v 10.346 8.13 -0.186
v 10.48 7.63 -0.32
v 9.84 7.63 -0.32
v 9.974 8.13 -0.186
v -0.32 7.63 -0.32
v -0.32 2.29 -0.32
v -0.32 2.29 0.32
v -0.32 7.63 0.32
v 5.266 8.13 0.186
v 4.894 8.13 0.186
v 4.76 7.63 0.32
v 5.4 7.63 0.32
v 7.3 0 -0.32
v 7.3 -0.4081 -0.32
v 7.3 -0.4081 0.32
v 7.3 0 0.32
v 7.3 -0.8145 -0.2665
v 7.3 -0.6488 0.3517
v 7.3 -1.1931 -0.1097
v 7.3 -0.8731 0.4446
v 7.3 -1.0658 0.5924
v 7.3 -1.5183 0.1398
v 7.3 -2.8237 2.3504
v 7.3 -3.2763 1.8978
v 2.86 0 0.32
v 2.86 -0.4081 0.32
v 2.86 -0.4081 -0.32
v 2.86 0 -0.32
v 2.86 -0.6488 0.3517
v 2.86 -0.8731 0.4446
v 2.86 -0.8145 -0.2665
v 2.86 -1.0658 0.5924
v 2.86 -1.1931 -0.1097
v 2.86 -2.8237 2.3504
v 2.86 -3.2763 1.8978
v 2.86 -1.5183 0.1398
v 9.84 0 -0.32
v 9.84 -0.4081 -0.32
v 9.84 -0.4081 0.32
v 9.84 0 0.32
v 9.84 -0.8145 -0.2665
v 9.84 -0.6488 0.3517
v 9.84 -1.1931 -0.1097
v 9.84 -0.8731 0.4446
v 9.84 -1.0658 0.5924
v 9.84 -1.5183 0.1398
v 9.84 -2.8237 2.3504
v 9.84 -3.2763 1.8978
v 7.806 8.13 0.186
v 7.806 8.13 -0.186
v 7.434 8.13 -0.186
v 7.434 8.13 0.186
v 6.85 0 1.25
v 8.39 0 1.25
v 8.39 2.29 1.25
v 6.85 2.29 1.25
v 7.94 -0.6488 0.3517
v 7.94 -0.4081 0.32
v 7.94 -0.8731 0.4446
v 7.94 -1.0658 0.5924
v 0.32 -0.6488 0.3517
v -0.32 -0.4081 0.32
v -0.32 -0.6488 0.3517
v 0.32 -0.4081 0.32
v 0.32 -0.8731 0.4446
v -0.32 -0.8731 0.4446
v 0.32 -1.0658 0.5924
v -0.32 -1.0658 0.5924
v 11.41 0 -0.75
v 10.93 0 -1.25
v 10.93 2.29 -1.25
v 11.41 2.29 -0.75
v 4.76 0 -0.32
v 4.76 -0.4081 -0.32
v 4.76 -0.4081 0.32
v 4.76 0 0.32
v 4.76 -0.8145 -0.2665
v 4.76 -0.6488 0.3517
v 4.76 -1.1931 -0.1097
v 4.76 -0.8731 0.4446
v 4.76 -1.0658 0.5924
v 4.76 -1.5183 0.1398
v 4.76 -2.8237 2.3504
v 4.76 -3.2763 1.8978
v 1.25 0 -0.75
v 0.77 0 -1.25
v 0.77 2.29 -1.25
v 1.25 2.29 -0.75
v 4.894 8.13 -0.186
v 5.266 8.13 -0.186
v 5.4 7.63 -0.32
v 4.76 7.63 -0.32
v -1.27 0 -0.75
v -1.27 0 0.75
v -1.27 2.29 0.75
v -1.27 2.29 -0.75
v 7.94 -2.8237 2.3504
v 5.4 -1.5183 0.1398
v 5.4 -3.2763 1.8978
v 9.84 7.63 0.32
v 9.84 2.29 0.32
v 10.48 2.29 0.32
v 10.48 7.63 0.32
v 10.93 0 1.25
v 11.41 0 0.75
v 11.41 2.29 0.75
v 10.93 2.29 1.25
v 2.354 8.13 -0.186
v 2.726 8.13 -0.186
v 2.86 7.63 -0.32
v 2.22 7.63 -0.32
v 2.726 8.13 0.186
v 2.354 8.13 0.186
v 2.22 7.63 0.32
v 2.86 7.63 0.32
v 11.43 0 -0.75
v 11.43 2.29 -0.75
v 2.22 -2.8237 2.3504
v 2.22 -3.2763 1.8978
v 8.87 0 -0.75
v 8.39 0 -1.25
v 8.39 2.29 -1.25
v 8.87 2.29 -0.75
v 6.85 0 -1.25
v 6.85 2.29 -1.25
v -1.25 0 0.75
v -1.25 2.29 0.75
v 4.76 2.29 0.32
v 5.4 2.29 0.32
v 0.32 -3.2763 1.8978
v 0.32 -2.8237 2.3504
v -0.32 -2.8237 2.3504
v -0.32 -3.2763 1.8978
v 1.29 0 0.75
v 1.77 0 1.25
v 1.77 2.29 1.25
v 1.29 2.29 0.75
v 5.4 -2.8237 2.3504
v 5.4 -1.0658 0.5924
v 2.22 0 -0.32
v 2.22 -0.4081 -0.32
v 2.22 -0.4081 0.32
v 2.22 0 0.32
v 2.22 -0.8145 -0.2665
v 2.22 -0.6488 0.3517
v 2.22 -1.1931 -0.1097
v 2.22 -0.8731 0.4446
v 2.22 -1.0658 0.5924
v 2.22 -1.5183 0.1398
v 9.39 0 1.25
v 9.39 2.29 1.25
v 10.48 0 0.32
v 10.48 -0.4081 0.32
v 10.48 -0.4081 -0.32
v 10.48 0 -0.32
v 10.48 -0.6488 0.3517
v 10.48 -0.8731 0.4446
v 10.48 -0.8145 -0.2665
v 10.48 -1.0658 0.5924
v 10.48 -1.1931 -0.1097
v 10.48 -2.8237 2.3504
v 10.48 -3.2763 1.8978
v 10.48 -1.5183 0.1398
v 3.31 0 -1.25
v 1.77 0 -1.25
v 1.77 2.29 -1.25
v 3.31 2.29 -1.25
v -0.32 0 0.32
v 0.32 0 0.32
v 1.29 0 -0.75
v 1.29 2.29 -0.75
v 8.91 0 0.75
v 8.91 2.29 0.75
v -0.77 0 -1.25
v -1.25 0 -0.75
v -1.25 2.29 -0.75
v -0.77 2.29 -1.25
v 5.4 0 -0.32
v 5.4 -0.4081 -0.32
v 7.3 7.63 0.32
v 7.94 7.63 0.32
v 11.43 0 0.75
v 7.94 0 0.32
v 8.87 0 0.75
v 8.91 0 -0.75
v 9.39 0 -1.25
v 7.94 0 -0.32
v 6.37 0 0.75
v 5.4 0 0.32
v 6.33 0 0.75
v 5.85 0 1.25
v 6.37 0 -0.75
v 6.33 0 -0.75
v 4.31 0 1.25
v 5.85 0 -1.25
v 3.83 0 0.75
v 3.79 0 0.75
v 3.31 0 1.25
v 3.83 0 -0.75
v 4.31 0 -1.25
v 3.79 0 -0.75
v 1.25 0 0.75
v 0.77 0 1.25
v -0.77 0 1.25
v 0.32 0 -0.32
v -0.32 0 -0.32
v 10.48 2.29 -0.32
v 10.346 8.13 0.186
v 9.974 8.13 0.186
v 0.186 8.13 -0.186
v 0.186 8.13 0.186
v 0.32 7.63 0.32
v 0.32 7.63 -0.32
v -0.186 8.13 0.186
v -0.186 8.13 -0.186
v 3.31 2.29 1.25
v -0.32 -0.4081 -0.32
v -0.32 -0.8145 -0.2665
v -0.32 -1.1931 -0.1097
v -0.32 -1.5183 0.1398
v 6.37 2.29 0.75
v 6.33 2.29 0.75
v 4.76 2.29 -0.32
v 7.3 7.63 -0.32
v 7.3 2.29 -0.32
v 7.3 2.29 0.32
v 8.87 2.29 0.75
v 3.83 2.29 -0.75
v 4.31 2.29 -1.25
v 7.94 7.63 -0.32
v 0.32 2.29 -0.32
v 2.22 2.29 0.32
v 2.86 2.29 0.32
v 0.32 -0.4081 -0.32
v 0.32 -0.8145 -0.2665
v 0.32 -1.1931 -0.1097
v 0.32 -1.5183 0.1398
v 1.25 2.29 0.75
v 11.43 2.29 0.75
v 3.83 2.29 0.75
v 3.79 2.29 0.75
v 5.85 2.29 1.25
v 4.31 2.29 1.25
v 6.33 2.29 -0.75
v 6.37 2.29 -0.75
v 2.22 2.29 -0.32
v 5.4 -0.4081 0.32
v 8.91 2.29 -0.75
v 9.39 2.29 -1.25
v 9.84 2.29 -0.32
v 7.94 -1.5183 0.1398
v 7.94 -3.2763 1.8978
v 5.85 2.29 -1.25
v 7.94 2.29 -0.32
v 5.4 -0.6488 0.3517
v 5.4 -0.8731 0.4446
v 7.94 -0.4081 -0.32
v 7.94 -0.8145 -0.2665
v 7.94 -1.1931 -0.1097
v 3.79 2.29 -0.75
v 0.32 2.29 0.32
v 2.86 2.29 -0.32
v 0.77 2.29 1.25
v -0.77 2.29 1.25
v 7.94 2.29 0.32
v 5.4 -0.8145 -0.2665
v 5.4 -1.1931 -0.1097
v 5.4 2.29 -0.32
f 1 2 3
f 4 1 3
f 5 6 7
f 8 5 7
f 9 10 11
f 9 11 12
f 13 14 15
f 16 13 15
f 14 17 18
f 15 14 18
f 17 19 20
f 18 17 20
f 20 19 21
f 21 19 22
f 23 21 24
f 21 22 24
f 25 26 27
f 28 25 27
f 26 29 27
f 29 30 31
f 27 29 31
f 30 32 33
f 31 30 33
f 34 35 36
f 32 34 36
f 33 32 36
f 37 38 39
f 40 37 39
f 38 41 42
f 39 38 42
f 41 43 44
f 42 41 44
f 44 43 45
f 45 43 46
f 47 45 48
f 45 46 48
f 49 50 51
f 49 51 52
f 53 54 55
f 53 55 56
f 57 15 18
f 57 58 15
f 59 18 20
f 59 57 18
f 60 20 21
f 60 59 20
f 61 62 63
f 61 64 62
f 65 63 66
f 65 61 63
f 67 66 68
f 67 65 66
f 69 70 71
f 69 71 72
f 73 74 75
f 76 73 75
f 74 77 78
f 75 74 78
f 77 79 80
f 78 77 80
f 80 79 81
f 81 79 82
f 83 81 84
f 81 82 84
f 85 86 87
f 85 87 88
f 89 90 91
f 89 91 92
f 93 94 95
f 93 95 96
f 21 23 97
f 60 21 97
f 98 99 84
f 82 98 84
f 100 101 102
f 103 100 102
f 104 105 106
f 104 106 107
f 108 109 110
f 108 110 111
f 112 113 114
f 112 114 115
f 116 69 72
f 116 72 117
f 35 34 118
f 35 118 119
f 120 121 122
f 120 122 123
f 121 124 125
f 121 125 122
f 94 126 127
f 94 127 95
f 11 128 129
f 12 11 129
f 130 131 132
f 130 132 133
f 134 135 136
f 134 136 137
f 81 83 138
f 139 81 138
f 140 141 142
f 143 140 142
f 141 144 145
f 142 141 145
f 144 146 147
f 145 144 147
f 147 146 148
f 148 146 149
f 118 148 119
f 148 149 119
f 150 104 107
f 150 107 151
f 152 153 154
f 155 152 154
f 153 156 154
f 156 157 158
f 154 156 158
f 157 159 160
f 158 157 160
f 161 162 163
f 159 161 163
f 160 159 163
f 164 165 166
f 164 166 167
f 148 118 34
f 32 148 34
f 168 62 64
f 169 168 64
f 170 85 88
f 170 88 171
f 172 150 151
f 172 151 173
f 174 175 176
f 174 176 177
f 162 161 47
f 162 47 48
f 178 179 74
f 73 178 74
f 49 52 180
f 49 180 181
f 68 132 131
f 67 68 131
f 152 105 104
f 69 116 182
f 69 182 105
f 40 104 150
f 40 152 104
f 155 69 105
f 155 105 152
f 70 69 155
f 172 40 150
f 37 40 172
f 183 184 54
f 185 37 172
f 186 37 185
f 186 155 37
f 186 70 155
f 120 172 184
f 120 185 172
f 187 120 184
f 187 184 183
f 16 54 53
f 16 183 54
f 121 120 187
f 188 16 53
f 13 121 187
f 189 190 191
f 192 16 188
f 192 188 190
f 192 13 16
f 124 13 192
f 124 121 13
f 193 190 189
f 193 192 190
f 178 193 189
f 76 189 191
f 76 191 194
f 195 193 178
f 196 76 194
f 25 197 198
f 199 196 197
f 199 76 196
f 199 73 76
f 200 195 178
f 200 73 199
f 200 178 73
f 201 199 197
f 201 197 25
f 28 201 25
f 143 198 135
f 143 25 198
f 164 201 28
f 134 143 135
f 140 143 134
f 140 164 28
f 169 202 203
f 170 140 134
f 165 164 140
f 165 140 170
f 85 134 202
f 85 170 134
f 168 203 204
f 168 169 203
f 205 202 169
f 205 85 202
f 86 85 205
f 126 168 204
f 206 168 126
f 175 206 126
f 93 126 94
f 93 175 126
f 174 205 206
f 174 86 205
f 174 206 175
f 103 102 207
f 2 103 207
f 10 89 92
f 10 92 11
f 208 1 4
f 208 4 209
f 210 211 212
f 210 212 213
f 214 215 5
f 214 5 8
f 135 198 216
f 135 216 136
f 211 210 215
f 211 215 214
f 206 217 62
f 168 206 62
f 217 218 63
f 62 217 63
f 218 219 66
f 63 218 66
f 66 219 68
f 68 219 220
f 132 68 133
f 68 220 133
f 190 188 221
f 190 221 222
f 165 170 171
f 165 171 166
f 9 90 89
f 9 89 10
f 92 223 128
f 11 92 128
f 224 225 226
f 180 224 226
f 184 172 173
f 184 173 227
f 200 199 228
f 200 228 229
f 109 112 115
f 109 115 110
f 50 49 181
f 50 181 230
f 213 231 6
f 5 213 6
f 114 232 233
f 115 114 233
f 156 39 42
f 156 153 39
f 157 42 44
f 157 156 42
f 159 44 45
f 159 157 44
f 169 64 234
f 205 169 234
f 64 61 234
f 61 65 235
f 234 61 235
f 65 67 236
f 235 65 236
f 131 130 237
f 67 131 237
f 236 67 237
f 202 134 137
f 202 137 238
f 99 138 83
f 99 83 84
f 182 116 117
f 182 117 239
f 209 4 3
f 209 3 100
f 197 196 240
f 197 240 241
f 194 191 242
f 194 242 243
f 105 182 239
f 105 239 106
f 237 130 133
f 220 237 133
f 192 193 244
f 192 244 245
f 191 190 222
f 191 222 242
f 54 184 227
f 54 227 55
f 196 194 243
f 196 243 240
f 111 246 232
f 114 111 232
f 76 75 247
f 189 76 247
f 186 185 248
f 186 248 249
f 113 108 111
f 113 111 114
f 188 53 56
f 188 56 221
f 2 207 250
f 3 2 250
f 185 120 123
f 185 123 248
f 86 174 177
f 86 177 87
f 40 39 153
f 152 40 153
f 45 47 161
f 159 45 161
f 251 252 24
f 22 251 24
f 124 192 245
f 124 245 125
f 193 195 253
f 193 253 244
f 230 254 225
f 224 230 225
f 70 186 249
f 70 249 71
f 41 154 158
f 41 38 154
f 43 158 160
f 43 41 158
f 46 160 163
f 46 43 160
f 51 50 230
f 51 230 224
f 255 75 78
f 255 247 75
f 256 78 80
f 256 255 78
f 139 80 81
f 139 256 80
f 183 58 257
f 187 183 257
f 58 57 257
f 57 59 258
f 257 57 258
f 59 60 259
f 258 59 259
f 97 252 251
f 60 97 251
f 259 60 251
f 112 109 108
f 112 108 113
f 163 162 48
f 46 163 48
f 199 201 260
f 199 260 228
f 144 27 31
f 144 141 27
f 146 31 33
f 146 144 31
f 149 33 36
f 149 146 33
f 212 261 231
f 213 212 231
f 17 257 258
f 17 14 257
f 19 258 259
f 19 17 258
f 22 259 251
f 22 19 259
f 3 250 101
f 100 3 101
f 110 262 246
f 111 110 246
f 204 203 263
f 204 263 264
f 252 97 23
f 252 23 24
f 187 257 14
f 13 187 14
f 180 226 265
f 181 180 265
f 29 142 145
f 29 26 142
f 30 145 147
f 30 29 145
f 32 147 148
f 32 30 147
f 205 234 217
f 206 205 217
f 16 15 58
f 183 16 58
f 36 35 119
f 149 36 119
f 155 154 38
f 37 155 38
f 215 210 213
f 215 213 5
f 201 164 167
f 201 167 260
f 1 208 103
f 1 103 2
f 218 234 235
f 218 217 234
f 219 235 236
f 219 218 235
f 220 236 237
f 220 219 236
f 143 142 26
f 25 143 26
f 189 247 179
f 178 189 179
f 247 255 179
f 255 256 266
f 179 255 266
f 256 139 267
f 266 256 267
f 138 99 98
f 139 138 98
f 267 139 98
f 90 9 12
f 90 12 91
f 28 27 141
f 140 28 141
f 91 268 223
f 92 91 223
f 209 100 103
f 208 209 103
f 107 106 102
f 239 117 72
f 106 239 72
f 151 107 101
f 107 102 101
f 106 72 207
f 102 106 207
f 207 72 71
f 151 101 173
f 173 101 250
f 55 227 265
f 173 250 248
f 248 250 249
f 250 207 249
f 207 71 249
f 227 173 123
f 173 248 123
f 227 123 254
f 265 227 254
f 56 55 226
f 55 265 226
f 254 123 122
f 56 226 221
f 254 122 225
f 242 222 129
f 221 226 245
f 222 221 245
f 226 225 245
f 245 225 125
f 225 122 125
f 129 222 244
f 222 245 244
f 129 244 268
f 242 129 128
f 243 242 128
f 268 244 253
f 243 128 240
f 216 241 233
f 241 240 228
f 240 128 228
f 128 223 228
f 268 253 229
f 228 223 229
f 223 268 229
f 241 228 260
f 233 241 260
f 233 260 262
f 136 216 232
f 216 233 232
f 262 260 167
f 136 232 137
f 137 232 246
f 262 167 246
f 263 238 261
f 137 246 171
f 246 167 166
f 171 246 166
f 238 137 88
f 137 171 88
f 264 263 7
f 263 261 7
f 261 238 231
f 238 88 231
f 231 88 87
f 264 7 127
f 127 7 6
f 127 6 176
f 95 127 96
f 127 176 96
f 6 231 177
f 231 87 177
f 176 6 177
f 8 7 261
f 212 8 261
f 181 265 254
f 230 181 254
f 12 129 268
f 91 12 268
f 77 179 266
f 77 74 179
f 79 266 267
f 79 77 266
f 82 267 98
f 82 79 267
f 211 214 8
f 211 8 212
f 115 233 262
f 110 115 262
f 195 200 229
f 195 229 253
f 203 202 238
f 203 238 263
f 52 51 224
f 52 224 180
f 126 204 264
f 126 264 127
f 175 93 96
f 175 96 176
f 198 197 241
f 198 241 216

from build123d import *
from OCP.BRepFilletAPI import BRepFilletAPI_MakeChamfer

# Parameters (mm, degrees)
BOSS_EXTRUDE1_DEPTH         = 2.29
SKETCH3_W                   = 0.64
SKETCH3_H                   = 0.64
CHAMFER3_SIZE               = 0.5
CHAMFER3_SIZE2              = 0.133974596
LPATTERN1_COUNT             = 5
LPATTERN1_PITCH             = 2.54
CHAMFER3_OF_LPATTERN1_SIZE  = 0.5
CHAMFER3_OF_LPATTERN1_SIZE2 = 0.133974596


with BuildPart() as part:
    # Sketch1 → Boss-Extrude1 (new body)
    with BuildSketch(Plane(origin=(0, 0, 0), x_dir=(1, 0, 0), z_dir=(0, 1, 0))):
        Polygon((-0.77, 1.25), (0.77, 1.25), (1.25, 0.75), (1.27, 0.75), (1.27, -0.75), (1.25, -0.75), (0.77, -1.25), (-0.77, -1.25), (-1.25, -0.75), (-1.27, -0.75), (-1.27, 0.75), (-1.25, 0.75), align=None)
    boss_extrude1 = extrude(amount=BOSS_EXTRUDE1_DEPTH)

    # Sweep1: sweep along a path in Sketch2
    with BuildLine(Plane(origin=(0, 0, 0), x_dir=(0, 0, -1), z_dir=(1, 0, 0))) as sweep1_path:
        Line((0, 8.13), (0, -0.408142235))
        ThreePointArc((0, -0.408142235), (-0.095150584, -0.886496526), (-0.366116524, -1.292025712))
        Line((-0.366116524, -1.292025712), (-2.124090812, -3.05))
    # Sketch3 → Sweep1 (sweep)
    with BuildSketch(Plane(origin=(0, 8.13, 0), x_dir=(1, 0, 0), z_dir=(0, 1, 0))):
        Rectangle(SKETCH3_W, SKETCH3_H)
    sweep1 = sweep(path=sweep1_path.line)

    # Chamfer3: one chamfer whose edges measure the first distance from different faces: ONE call of the kernel's chamfer builder (chamfer() names one face for all edges)
    chamfer3_edges_1 = [part.edges().sort_by_distance(p)[0] for p in [
        (0.32, 8.13, 0),
    ]]
    chamfer3_side_1 = [part.faces().sort_by_distance(p)[0] for p in [
        (0.32, 5.21, 0),
    ]]
    chamfer3_edges_2 = [part.edges().sort_by_distance(p)[0] for p in [
        (0, 8.13, -0.32),
    ]]
    chamfer3_side_2 = [part.faces().sort_by_distance(p)[0] for p in [
        (0, 5.21, -0.32),
    ]]
    chamfer3_edges_3 = [part.edges().sort_by_distance(p)[0] for p in [
        (-0.32, 8.13, 0),
    ]]
    chamfer3_side_3 = [part.faces().sort_by_distance(p)[0] for p in [
        (-0.32, 5.21, 0),
    ]]
    chamfer3_edges_4 = [part.edges().sort_by_distance(p)[0] for p in [
        (0, 8.13, 0.32),
    ]]
    chamfer3_side_4 = [part.faces().sort_by_distance(p)[0] for p in [
        (0, 5.21, 0.32),
    ]]
    chamfer3 = BRepFilletAPI_MakeChamfer(part.part.solid().wrapped)
    for e in chamfer3_edges_1:
        chamfer3.Add(CHAMFER3_SIZE, CHAMFER3_SIZE2, e.wrapped, chamfer3_side_1[0].wrapped)  # the first distance lies on this face
    for e in chamfer3_edges_2:
        chamfer3.Add(CHAMFER3_SIZE, CHAMFER3_SIZE2, e.wrapped, chamfer3_side_2[0].wrapped)  # the first distance lies on this face
    for e in chamfer3_edges_3:
        chamfer3.Add(CHAMFER3_SIZE, CHAMFER3_SIZE2, e.wrapped, chamfer3_side_3[0].wrapped)  # the first distance lies on this face
    for e in chamfer3_edges_4:
        chamfer3.Add(CHAMFER3_SIZE, CHAMFER3_SIZE2, e.wrapped, chamfer3_side_4[0].wrapped)  # the first distance lies on this face
    add(Compound.cast(chamfer3.Shape()), mode=Mode.REPLACE)

    # LPattern1: Boss-Extrude1, Sweep1 ×5
    with Locations(*[(i * LPATTERN1_PITCH, 0, 0) for i in range(1, LPATTERN1_COUNT)]):
        add(boss_extrude1)
        add(sweep1)

    # Chamfer3 of LPattern1: one chamfer whose edges measure the first distance from different faces: ONE call of the kernel's chamfer builder (chamfer() names one face for all edges)
    chamfer3_of_lpattern1_edges_1 = [part.edges().sort_by_distance(p)[0] for p in [
        (2.86, 8.13, 0),
    ]]
    chamfer3_of_lpattern1_side_1 = [part.faces().sort_by_distance(p)[0] for p in [
        (2.86, 5.21, 0),
    ]]
    chamfer3_of_lpattern1_edges_2 = [part.edges().sort_by_distance(p)[0] for p in [
        (2.54, 8.13, -0.32),
    ]]
    chamfer3_of_lpattern1_side_2 = [part.faces().sort_by_distance(p)[0] for p in [
        (2.54, 5.21, -0.32),
    ]]
    chamfer3_of_lpattern1_edges_3 = [part.edges().sort_by_distance(p)[0] for p in [
        (2.22, 8.13, 0),
    ]]
    chamfer3_of_lpattern1_side_3 = [part.faces().sort_by_distance(p)[0] for p in [
        (2.22, 5.21, 0),
    ]]
    chamfer3_of_lpattern1_edges_4 = [part.edges().sort_by_distance(p)[0] for p in [
        (2.54, 8.13, 0.32),
    ]]
    chamfer3_of_lpattern1_side_4 = [part.faces().sort_by_distance(p)[0] for p in [
        (2.54, 5.21, 0.32),
    ]]
    chamfer3_of_lpattern1_edges_5 = [part.edges().sort_by_distance(p)[0] for p in [
        (5.4, 8.13, 0),
    ]]
    chamfer3_of_lpattern1_side_5 = [part.faces().sort_by_distance(p)[0] for p in [
        (5.4, 5.21, 0),
    ]]
    chamfer3_of_lpattern1_edges_6 = [part.edges().sort_by_distance(p)[0] for p in [
        (5.08, 8.13, -0.32),
    ]]
    chamfer3_of_lpattern1_side_6 = [part.faces().sort_by_distance(p)[0] for p in [
        (5.08, 5.21, -0.32),
    ]]
    chamfer3_of_lpattern1_edges_7 = [part.edges().sort_by_distance(p)[0] for p in [
        (4.76, 8.13, 0),
    ]]
    chamfer3_of_lpattern1_side_7 = [part.faces().sort_by_distance(p)[0] for p in [
        (4.76, 5.21, 0),
    ]]
    chamfer3_of_lpattern1_edges_8 = [part.edges().sort_by_distance(p)[0] for p in [
        (5.08, 8.13, 0.32),
    ]]
    chamfer3_of_lpattern1_side_8 = [part.faces().sort_by_distance(p)[0] for p in [
        (5.08, 5.21, 0.32),
    ]]
    chamfer3_of_lpattern1_edges_9 = [part.edges().sort_by_distance(p)[0] for p in [
        (7.94, 8.13, 0),
    ]]
    chamfer3_of_lpattern1_side_9 = [part.faces().sort_by_distance(p)[0] for p in [
        (7.94, 5.21, 0),
    ]]
    chamfer3_of_lpattern1_edges_10 = [part.edges().sort_by_distance(p)[0] for p in [
        (7.62, 8.13, -0.32),
    ]]
    chamfer3_of_lpattern1_side_10 = [part.faces().sort_by_distance(p)[0] for p in [
        (7.62, 5.21, -0.32),
    ]]
    chamfer3_of_lpattern1_edges_11 = [part.edges().sort_by_distance(p)[0] for p in [
        (7.3, 8.13, 0),
    ]]
    chamfer3_of_lpattern1_side_11 = [part.faces().sort_by_distance(p)[0] for p in [
        (7.3, 5.21, 0),
    ]]
    chamfer3_of_lpattern1_edges_12 = [part.edges().sort_by_distance(p)[0] for p in [
        (7.62, 8.13, 0.32),
    ]]
    chamfer3_of_lpattern1_side_12 = [part.faces().sort_by_distance(p)[0] for p in [
        (7.62, 5.21, 0.32),
    ]]
    chamfer3_of_lpattern1_edges_13 = [part.edges().sort_by_distance(p)[0] for p in [
        (10.48, 8.13, 0),
    ]]
    chamfer3_of_lpattern1_side_13 = [part.faces().sort_by_distance(p)[0] for p in [
        (10.48, 5.21, 0),
    ]]
    chamfer3_of_lpattern1_edges_14 = [part.edges().sort_by_distance(p)[0] for p in [
        (10.16, 8.13, -0.32),
    ]]
    chamfer3_of_lpattern1_side_14 = [part.faces().sort_by_distance(p)[0] for p in [
        (10.16, 5.21, -0.32),
    ]]
    chamfer3_of_lpattern1_edges_15 = [part.edges().sort_by_distance(p)[0] for p in [
        (9.84, 8.13, 0),
    ]]
    chamfer3_of_lpattern1_side_15 = [part.faces().sort_by_distance(p)[0] for p in [
        (9.84, 5.21, 0),
    ]]
    chamfer3_of_lpattern1_edges_16 = [part.edges().sort_by_distance(p)[0] for p in [
        (10.16, 8.13, 0.32),
    ]]
    chamfer3_of_lpattern1_side_16 = [part.faces().sort_by_distance(p)[0] for p in [
        (10.16, 5.21, 0.32),
    ]]
    chamfer3_of_lpattern1 = BRepFilletAPI_MakeChamfer(part.part.solid().wrapped)
    for e in chamfer3_of_lpattern1_edges_1:
        chamfer3_of_lpattern1.Add(CHAMFER3_OF_LPATTERN1_SIZE, CHAMFER3_OF_LPATTERN1_SIZE2, e.wrapped, chamfer3_of_lpattern1_side_1[0].wrapped)  # the first distance lies on this face
    for e in chamfer3_of_lpattern1_edges_2:
        chamfer3_of_lpattern1.Add(CHAMFER3_OF_LPATTERN1_SIZE, CHAMFER3_OF_LPATTERN1_SIZE2, e.wrapped, chamfer3_of_lpattern1_side_2[0].wrapped)  # the first distance lies on this face
    for e in chamfer3_of_lpattern1_edges_3:
        chamfer3_of_lpattern1.Add(CHAMFER3_OF_LPATTERN1_SIZE, CHAMFER3_OF_LPATTERN1_SIZE2, e.wrapped, chamfer3_of_lpattern1_side_3[0].wrapped)  # the first distance lies on this face
    for e in chamfer3_of_lpattern1_edges_4:
        chamfer3_of_lpattern1.Add(CHAMFER3_OF_LPATTERN1_SIZE, CHAMFER3_OF_LPATTERN1_SIZE2, e.wrapped, chamfer3_of_lpattern1_side_4[0].wrapped)  # the first distance lies on this face
    for e in chamfer3_of_lpattern1_edges_5:
        chamfer3_of_lpattern1.Add(CHAMFER3_OF_LPATTERN1_SIZE, CHAMFER3_OF_LPATTERN1_SIZE2, e.wrapped, chamfer3_of_lpattern1_side_5[0].wrapped)  # the first distance lies on this face
    for e in chamfer3_of_lpattern1_edges_6:
        chamfer3_of_lpattern1.Add(CHAMFER3_OF_LPATTERN1_SIZE, CHAMFER3_OF_LPATTERN1_SIZE2, e.wrapped, chamfer3_of_lpattern1_side_6[0].wrapped)  # the first distance lies on this face
    for e in chamfer3_of_lpattern1_edges_7:
        chamfer3_of_lpattern1.Add(CHAMFER3_OF_LPATTERN1_SIZE, CHAMFER3_OF_LPATTERN1_SIZE2, e.wrapped, chamfer3_of_lpattern1_side_7[0].wrapped)  # the first distance lies on this face
    for e in chamfer3_of_lpattern1_edges_8:
        chamfer3_of_lpattern1.Add(CHAMFER3_OF_LPATTERN1_SIZE, CHAMFER3_OF_LPATTERN1_SIZE2, e.wrapped, chamfer3_of_lpattern1_side_8[0].wrapped)  # the first distance lies on this face
    for e in chamfer3_of_lpattern1_edges_9:
        chamfer3_of_lpattern1.Add(CHAMFER3_OF_LPATTERN1_SIZE, CHAMFER3_OF_LPATTERN1_SIZE2, e.wrapped, chamfer3_of_lpattern1_side_9[0].wrapped)  # the first distance lies on this face
    for e in chamfer3_of_lpattern1_edges_10:
        chamfer3_of_lpattern1.Add(CHAMFER3_OF_LPATTERN1_SIZE, CHAMFER3_OF_LPATTERN1_SIZE2, e.wrapped, chamfer3_of_lpattern1_side_10[0].wrapped)  # the first distance lies on this face
    for e in chamfer3_of_lpattern1_edges_11:
        chamfer3_of_lpattern1.Add(CHAMFER3_OF_LPATTERN1_SIZE, CHAMFER3_OF_LPATTERN1_SIZE2, e.wrapped, chamfer3_of_lpattern1_side_11[0].wrapped)  # the first distance lies on this face
    for e in chamfer3_of_lpattern1_edges_12:
        chamfer3_of_lpattern1.Add(CHAMFER3_OF_LPATTERN1_SIZE, CHAMFER3_OF_LPATTERN1_SIZE2, e.wrapped, chamfer3_of_lpattern1_side_12[0].wrapped)  # the first distance lies on this face
    for e in chamfer3_of_lpattern1_edges_13:
        chamfer3_of_lpattern1.Add(CHAMFER3_OF_LPATTERN1_SIZE, CHAMFER3_OF_LPATTERN1_SIZE2, e.wrapped, chamfer3_of_lpattern1_side_13[0].wrapped)  # the first distance lies on this face
    for e in chamfer3_of_lpattern1_edges_14:
        chamfer3_of_lpattern1.Add(CHAMFER3_OF_LPATTERN1_SIZE, CHAMFER3_OF_LPATTERN1_SIZE2, e.wrapped, chamfer3_of_lpattern1_side_14[0].wrapped)  # the first distance lies on this face
    for e in chamfer3_of_lpattern1_edges_15:
        chamfer3_of_lpattern1.Add(CHAMFER3_OF_LPATTERN1_SIZE, CHAMFER3_OF_LPATTERN1_SIZE2, e.wrapped, chamfer3_of_lpattern1_side_15[0].wrapped)  # the first distance lies on this face
    for e in chamfer3_of_lpattern1_edges_16:
        chamfer3_of_lpattern1.Add(CHAMFER3_OF_LPATTERN1_SIZE, CHAMFER3_OF_LPATTERN1_SIZE2, e.wrapped, chamfer3_of_lpattern1_side_16[0].wrapped)  # the first distance lies on this face
    add(Compound.cast(chamfer3_of_lpattern1.Shape()), mode=Mode.REPLACE)


solid = part.part
